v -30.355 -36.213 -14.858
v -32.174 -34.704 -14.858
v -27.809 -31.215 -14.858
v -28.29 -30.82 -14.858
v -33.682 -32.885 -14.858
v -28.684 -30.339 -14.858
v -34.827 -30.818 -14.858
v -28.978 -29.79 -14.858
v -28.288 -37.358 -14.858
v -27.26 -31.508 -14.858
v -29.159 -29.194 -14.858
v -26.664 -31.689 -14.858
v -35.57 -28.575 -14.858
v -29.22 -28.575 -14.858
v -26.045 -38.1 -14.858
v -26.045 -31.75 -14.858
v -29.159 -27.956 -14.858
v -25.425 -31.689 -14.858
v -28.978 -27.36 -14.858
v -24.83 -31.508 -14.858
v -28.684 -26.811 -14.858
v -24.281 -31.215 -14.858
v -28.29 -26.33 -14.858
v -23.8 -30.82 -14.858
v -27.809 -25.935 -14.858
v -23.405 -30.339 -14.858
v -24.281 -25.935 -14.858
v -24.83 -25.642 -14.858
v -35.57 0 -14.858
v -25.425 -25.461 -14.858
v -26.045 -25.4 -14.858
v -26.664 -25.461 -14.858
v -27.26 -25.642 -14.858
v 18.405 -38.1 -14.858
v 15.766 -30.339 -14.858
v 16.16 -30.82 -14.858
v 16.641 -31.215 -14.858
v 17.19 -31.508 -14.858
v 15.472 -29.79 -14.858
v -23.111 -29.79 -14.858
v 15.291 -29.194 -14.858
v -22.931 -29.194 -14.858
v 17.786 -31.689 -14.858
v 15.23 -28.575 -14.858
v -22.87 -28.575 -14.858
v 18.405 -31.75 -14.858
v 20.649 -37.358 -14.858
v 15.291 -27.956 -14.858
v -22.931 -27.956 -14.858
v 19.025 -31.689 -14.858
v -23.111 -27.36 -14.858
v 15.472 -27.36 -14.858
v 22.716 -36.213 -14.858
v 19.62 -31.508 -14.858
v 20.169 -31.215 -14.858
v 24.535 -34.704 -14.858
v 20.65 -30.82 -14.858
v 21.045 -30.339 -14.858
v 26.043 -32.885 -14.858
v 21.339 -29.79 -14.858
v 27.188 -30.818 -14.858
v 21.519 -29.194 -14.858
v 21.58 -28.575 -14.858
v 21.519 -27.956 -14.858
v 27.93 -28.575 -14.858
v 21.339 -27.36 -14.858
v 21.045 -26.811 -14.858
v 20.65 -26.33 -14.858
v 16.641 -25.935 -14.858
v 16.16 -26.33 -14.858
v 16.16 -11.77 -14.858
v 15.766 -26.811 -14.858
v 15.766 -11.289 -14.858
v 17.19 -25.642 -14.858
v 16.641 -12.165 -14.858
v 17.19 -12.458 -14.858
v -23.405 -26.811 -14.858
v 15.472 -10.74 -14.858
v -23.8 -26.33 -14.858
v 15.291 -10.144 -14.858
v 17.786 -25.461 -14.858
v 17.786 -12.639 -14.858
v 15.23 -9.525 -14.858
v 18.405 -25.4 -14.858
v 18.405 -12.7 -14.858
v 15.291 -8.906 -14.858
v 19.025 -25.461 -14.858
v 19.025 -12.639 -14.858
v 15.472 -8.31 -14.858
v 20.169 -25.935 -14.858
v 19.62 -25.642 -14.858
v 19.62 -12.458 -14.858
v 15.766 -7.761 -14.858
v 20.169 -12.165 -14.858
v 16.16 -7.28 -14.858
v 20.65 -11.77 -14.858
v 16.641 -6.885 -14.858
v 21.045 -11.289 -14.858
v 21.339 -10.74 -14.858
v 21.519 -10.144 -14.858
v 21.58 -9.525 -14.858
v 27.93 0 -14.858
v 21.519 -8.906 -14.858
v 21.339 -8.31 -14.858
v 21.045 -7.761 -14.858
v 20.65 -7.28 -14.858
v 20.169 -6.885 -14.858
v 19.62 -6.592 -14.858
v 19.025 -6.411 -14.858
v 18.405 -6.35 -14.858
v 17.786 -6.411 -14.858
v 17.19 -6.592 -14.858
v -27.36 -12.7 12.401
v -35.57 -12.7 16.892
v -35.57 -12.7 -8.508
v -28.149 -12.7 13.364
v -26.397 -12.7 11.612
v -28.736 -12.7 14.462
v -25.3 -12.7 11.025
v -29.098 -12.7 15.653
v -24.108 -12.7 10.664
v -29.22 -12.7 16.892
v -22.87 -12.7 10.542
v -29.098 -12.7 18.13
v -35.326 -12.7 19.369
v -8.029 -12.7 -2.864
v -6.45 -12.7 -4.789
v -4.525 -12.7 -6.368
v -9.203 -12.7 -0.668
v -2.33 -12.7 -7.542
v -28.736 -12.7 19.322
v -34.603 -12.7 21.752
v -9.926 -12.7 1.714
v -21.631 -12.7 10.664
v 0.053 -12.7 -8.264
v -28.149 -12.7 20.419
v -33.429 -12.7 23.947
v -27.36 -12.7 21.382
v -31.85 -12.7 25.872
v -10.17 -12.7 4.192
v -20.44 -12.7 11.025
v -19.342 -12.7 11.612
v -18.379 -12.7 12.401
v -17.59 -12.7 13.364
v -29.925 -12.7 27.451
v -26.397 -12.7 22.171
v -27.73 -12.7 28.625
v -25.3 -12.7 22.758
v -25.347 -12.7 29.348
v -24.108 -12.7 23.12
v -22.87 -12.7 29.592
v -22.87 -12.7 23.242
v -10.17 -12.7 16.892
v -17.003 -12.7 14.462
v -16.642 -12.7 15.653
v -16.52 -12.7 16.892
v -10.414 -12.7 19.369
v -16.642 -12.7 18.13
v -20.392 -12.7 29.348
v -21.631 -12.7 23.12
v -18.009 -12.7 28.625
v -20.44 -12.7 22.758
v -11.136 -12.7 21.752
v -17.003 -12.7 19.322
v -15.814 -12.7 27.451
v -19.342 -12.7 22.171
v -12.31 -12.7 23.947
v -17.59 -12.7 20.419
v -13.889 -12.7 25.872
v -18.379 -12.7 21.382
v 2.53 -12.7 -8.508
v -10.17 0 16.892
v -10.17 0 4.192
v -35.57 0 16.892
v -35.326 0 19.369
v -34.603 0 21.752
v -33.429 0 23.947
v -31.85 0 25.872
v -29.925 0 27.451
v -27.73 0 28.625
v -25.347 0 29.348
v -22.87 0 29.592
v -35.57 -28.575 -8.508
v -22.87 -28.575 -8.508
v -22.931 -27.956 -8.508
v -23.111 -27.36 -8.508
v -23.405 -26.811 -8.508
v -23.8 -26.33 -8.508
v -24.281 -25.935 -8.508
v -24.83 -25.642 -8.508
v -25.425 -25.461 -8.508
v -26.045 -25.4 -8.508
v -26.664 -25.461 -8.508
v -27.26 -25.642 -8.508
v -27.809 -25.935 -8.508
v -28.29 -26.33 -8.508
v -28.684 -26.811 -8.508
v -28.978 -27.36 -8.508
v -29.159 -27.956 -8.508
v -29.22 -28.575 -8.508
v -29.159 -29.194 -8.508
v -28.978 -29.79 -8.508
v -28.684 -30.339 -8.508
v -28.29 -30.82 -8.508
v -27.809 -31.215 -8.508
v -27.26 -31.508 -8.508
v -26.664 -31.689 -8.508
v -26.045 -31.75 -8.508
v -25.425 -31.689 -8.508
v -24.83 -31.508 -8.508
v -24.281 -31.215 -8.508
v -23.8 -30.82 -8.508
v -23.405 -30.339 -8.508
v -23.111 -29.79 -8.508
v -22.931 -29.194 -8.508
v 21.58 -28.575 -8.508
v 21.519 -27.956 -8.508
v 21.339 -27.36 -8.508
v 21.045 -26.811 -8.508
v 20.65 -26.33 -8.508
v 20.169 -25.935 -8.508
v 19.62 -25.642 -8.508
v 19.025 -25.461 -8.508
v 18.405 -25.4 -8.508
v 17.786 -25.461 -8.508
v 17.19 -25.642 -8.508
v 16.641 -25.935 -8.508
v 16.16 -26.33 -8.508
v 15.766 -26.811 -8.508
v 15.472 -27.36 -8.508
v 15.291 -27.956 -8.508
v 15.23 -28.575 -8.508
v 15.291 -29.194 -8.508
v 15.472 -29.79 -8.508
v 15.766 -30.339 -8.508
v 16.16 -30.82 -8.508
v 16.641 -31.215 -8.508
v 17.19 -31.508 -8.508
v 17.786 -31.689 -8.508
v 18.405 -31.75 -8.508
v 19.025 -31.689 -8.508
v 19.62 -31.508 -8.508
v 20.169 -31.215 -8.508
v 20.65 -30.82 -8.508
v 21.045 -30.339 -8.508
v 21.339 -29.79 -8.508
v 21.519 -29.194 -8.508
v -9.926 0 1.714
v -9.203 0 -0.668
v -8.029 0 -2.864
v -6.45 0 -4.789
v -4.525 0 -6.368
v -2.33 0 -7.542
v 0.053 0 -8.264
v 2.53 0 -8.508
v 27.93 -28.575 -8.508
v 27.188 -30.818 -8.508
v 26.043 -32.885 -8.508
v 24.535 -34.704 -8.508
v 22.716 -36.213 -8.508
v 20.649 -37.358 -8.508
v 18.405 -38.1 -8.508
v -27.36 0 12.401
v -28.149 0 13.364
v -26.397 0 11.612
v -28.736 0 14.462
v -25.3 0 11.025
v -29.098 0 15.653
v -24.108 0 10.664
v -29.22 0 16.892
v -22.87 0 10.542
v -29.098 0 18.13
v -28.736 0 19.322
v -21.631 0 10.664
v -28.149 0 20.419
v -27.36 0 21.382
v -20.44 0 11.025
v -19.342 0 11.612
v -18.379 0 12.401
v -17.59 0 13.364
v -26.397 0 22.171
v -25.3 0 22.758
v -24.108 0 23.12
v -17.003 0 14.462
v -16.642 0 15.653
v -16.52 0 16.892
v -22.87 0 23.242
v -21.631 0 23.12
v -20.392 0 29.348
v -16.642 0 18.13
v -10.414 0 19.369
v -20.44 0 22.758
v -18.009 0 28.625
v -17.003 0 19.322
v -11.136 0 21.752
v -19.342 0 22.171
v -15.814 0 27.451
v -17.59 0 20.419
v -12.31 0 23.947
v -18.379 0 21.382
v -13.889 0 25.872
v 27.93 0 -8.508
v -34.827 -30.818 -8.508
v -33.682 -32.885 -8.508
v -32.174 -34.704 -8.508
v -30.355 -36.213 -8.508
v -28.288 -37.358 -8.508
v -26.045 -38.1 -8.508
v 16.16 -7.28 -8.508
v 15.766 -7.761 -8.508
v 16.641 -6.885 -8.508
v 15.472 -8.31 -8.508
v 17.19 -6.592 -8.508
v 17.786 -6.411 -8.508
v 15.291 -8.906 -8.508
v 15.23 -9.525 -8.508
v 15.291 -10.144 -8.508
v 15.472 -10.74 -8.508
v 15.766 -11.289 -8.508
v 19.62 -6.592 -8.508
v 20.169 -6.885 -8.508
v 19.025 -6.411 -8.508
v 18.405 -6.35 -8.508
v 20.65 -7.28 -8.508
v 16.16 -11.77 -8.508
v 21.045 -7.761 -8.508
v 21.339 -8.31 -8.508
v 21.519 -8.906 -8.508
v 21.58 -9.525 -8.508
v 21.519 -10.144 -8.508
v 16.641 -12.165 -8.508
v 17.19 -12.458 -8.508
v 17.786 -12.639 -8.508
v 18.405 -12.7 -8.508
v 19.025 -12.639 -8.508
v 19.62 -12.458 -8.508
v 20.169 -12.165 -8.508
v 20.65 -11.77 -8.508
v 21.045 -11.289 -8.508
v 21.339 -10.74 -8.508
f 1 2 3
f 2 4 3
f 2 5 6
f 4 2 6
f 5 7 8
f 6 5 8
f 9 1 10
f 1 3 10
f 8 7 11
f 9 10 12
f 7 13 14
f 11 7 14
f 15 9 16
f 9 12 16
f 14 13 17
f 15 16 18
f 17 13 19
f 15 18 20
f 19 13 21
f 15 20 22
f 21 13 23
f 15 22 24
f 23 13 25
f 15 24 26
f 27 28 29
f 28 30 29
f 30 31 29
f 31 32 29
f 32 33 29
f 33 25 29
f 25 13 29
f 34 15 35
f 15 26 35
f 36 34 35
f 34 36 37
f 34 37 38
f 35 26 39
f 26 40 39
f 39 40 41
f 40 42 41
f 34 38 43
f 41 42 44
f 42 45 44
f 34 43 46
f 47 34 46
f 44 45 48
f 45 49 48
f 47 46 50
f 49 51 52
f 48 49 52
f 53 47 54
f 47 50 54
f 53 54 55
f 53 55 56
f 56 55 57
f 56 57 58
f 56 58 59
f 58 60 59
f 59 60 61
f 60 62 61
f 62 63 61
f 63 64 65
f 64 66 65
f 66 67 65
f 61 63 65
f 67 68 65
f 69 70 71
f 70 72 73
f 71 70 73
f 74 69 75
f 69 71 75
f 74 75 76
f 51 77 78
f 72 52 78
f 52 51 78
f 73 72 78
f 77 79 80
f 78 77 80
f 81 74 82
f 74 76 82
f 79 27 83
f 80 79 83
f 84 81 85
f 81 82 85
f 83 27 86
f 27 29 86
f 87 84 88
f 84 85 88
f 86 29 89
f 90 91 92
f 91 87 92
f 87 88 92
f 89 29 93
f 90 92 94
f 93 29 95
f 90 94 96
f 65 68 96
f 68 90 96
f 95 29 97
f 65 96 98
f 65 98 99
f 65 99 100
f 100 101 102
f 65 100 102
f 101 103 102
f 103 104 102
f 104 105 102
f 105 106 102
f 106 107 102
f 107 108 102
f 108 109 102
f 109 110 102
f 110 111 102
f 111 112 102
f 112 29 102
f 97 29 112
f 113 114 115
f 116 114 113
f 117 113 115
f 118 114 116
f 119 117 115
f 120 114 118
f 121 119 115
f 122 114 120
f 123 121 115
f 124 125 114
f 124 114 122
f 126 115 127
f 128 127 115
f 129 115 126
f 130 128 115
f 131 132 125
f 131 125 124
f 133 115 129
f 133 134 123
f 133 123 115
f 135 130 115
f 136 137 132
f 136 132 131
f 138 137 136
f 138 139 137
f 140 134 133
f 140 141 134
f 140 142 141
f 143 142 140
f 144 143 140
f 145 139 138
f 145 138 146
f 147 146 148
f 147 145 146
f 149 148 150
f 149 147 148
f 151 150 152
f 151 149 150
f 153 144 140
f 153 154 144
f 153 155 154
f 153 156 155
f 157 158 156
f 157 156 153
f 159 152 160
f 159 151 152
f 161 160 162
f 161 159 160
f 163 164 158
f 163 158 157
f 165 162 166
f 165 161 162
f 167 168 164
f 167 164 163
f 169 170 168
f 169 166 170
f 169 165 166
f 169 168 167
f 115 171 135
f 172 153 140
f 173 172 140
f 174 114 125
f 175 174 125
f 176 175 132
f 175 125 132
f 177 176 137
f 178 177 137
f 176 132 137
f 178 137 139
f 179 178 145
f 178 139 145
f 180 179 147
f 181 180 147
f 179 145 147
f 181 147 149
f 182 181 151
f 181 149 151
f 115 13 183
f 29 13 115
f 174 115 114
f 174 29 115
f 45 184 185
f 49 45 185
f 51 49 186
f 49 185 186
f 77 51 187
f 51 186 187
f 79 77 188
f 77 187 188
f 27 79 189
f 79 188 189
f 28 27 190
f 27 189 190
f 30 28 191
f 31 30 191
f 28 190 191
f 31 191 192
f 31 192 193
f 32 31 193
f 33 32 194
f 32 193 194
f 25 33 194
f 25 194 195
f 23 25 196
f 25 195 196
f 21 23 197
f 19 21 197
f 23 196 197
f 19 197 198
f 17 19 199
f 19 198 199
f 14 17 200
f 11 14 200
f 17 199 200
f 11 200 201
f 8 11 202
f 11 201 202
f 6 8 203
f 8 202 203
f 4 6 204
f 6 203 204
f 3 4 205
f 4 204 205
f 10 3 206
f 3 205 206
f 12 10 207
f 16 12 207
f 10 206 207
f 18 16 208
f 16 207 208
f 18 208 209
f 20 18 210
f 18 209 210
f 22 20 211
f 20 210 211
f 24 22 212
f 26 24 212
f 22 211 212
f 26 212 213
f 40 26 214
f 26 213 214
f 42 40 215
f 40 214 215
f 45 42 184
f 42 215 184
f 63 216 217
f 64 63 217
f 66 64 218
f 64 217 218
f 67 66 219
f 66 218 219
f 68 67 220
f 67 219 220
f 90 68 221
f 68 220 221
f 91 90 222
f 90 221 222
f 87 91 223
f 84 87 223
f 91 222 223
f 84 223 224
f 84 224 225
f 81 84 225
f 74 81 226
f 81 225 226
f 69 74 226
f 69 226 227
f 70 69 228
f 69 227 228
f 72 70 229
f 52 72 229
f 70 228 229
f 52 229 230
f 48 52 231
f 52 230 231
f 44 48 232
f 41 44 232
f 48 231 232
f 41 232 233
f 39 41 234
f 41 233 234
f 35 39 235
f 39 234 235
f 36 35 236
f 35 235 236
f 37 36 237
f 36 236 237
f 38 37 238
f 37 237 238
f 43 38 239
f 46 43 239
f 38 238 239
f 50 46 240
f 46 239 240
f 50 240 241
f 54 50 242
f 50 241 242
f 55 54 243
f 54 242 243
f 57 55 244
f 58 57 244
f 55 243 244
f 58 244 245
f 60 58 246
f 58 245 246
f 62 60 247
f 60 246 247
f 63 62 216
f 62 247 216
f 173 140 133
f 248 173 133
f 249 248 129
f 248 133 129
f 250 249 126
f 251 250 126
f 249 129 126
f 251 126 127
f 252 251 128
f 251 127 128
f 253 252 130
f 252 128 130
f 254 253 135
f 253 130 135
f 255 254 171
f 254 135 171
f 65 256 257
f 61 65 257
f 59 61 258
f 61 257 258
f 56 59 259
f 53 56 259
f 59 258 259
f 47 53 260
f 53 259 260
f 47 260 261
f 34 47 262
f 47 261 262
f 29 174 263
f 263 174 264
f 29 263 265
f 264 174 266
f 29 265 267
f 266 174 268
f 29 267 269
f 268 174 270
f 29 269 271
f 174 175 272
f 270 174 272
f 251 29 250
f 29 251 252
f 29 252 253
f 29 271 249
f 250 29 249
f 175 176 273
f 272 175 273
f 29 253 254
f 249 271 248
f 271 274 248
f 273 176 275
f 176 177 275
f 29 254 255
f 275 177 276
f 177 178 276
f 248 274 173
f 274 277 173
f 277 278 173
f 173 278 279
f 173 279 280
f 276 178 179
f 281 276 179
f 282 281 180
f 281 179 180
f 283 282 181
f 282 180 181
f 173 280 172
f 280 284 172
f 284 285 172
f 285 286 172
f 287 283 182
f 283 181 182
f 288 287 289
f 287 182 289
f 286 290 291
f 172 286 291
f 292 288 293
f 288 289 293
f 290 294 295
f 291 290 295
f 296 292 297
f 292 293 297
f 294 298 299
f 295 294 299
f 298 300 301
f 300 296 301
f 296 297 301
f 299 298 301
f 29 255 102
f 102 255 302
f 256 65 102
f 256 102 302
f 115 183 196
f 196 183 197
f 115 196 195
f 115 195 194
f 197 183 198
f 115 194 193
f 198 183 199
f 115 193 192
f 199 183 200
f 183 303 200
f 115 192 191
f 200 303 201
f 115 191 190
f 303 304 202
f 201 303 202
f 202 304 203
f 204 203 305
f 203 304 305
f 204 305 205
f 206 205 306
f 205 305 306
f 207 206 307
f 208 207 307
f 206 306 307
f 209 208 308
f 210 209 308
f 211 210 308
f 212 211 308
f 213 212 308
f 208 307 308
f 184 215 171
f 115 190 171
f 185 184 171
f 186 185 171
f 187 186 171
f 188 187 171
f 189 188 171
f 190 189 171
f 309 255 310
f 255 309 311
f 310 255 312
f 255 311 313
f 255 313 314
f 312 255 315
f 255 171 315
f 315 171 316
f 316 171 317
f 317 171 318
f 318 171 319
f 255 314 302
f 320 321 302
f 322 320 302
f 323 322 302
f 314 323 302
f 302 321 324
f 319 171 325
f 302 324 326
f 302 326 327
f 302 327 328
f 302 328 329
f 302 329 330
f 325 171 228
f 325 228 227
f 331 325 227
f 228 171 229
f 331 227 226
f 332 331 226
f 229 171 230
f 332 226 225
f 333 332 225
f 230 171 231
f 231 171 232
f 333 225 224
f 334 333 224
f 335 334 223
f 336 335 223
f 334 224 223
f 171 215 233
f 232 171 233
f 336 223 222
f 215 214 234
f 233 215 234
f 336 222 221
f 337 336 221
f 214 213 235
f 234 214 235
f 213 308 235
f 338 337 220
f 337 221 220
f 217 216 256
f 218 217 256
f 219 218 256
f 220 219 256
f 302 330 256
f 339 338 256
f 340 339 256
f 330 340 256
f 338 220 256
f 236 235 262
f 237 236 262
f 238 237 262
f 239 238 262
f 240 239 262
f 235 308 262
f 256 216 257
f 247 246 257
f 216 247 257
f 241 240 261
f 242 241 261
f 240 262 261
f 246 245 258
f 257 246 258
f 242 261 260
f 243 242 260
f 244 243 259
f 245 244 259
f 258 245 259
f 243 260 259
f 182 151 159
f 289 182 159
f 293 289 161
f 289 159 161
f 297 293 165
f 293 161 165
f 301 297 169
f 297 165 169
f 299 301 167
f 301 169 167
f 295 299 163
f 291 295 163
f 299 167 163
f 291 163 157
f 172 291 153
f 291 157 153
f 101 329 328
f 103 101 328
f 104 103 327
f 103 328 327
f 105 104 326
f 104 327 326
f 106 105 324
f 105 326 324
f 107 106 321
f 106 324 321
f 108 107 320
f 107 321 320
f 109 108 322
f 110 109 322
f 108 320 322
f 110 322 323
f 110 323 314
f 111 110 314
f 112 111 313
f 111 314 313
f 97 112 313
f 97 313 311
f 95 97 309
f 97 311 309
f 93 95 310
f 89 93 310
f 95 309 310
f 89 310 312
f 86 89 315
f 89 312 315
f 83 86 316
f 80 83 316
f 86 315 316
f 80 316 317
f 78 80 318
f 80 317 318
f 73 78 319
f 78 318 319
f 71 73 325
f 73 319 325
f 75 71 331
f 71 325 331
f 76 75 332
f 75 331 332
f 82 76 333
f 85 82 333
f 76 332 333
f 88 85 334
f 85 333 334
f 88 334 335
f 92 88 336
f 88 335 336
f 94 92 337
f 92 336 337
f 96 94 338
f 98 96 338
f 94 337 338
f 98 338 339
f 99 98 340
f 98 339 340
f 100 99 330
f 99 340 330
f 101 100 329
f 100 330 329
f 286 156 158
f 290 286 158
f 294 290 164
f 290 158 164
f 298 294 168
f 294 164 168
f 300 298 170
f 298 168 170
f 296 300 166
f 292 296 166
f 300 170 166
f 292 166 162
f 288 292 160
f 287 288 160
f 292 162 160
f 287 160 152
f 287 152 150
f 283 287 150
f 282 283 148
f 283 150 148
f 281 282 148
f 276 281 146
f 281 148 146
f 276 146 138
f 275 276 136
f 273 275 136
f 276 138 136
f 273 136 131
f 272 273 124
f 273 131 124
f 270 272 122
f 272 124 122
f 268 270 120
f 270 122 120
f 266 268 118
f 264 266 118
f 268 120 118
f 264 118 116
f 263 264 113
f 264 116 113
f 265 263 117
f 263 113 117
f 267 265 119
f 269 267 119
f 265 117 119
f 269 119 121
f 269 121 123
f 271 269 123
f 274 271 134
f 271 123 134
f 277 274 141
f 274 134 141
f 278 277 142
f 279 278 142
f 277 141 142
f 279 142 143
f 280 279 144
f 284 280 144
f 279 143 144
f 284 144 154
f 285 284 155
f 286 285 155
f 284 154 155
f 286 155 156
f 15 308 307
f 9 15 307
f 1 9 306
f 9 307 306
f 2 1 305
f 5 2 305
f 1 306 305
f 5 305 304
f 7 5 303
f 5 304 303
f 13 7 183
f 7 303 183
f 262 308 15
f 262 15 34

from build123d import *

# Parameters (mm, degrees)
F0_W     = 63.5
F0_H     = 44.45
F1_DEPTH = 38.1
F2_W     = 63.5
F2_H     = 38.1
F3_DEPTH = 25.4
F4_R     = 6.35
F5_DEPTH = 12.7
F6_R     = 3.175
F7_DEPTH = 6.35


with BuildPart() as f1:
    # F0 (on Front) → F1 (new body)
    with BuildSketch(Plane.XZ):
        with Locations((-3.8195736706, 7.3665864387)):
            Rectangle(F0_W, F0_H)
    extrude(amount=F1_DEPTH)

    # F2 (on face) → F3 (cut)
    with BuildSketch(Plane.XZ.offset(38.1)):
        with Locations((-3.8195736706, 10.5415864387)):
            Rectangle(F2_W, F2_H)
    extrude(amount=-F3_DEPTH, mode=Mode.SUBTRACT)

    # F4 (on face) → F5 (cut)
    with BuildSketch(Plane.XZ.offset(12.7)):
        with BuildLine():
            Line((-35.5695736706, 29.5915864387), (-35.5695736706, 16.8915864387))
            ThreePointArc((-35.5695736706, 16.8915864387), (-31.8498297917, 25.8718425598), (-22.8695736706, 29.5915864387))
            Line((-22.8695736706, 29.5915864387), (-35.5695736706, 29.5915864387))
        make_face()
        with BuildLine():
            ThreePointArc((-10.1695736706, 4.1915864387), (-6.4498297917, -4.7886696824), (2.5304263294, -8.5084135613))
            Line((2.5304263294, -8.5084135613), (27.9304263294, -8.5084135613))
            Line((27.9304263294, -8.5084135613), (27.9304263294, 29.5915864387))
            Line((27.9304263294, 29.5915864387), (-22.8695736706, 29.5915864387))
            ThreePointArc((-22.8695736706, 29.5915864387), (-13.8893175496, 25.8718425598), (-10.1695736706, 16.8915864387))
            Line((-10.1695736706, 16.8915864387), (-10.1695736706, 4.1915864387))
        make_face()
        with Locations((-22.8695736706, 16.8915864387)):
            Circle(F4_R)
    extrude(amount=-F5_DEPTH, mode=Mode.SUBTRACT)

    # F6 (on face) → F7 (cut)
    with BuildSketch(Plane.XY.offset(-8.5084135613)):
        with Locations((18.4054263294, -9.525)):
            Circle(F6_R)
        with Locations((18.4054263294, -28.575)):
            Circle(F6_R)
        with Locations((-26.0445736706, -28.575)):
            Circle(F6_R)
        with BuildLine():
            Line((-35.5695736706, -38.1), (-26.0445736706, -38.1))
            ThreePointArc((-26.0445736706, -38.1), (-32.1739472484, -34.7043735778), (-35.5695736706, -28.575))
            Line((-35.5695736706, -28.575), (-35.5695736706, -38.1))
        make_face()
        with BuildLine():
            ThreePointArc((27.9304263294, -28.575), (24.5347999072, -34.7043735778), (18.4054263294, -38.1))
            Line((18.4054263294, -38.1), (27.9304263294, -38.1))
            Line((27.9304263294, -38.1), (27.9304263294, -28.575))
        make_face()
    extrude(amount=-F7_DEPTH, mode=Mode.SUBTRACT)


solid = f1.part
